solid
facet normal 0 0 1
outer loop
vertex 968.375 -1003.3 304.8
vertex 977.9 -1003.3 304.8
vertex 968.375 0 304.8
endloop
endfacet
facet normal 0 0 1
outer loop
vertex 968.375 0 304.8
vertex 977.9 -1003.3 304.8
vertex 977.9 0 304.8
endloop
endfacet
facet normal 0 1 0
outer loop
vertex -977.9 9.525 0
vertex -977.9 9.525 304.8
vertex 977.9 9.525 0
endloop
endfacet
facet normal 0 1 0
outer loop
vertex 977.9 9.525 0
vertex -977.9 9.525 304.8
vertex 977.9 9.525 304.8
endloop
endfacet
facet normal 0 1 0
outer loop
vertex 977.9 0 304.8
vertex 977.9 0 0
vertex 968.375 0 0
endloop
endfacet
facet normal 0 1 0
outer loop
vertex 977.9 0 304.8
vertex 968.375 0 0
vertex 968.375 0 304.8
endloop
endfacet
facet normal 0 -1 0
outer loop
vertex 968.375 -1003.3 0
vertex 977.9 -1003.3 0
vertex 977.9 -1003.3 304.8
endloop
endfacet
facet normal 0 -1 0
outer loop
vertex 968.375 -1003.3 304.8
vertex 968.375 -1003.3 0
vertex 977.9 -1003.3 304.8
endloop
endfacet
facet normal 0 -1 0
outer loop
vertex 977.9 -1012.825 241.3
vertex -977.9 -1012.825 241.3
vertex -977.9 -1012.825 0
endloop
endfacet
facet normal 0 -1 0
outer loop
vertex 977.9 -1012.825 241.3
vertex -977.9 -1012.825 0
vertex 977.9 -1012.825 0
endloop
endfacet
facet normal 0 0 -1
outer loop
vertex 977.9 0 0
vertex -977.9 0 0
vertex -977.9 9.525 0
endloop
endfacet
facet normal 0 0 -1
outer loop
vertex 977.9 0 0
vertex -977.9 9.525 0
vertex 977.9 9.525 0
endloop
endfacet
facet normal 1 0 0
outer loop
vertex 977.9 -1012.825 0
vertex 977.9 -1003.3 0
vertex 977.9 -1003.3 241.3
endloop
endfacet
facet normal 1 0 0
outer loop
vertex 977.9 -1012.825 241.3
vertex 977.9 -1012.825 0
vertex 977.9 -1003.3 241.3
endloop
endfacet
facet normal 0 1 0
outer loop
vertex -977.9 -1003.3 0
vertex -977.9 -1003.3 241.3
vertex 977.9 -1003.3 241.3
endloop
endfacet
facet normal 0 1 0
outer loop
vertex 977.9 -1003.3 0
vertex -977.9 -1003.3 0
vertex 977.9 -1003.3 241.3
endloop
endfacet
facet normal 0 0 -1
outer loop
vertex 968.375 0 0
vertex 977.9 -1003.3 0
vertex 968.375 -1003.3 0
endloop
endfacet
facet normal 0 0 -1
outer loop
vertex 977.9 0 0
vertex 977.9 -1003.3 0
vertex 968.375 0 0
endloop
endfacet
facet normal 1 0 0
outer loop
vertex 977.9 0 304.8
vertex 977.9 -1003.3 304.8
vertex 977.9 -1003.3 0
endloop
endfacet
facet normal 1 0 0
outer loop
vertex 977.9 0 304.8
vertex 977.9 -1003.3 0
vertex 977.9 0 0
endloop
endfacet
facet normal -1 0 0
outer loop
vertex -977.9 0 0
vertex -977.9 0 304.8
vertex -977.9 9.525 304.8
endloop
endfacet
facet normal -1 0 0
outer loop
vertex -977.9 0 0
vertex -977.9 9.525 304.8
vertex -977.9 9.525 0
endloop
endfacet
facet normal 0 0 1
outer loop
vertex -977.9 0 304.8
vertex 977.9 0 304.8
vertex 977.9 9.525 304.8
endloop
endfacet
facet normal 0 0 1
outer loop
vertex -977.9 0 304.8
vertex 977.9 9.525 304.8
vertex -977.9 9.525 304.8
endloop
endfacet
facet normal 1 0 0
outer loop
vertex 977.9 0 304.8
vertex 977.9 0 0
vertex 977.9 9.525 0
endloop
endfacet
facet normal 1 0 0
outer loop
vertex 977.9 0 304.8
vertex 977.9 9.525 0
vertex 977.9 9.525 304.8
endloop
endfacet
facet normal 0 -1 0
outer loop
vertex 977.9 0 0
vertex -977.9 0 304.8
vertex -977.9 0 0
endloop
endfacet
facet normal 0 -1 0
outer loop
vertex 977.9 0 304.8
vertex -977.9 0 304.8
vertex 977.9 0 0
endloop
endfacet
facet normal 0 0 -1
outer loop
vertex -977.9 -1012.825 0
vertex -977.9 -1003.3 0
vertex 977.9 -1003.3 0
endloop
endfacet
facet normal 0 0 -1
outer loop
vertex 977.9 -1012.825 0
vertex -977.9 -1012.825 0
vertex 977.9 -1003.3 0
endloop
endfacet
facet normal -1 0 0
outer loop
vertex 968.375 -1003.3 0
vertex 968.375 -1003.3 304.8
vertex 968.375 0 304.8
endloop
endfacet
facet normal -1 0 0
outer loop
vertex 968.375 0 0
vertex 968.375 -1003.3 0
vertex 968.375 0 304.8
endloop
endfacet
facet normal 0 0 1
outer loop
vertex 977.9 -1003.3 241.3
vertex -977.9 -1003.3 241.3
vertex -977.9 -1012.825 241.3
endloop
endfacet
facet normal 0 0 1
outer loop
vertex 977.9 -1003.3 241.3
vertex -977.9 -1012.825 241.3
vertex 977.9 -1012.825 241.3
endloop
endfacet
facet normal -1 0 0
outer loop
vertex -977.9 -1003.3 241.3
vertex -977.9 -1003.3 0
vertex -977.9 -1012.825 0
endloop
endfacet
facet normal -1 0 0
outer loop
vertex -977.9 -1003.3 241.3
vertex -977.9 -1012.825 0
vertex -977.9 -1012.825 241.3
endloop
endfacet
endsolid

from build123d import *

# Parameters (mm, degrees)
F1_DEPTH = 9.525
F3_W     = 1955.8
F3_H     = 241.3
F4_DEPTH = 9.525
F6_W     = 1003.3
F6_H     = 304.8
F7_DEPTH = 9.525


with BuildPart() as f1:
    # F0 (on Front) → F1 (new body)
    with BuildSketch(Plane.XZ):
        Polygon((-977.9, 304.8), (-977.9, 0), (0, 0), (977.9, 0), (977.9, 304.8), align=None)
    extrude(amount=-F1_DEPTH)


with BuildPart() as f4:
    # F3 (on offset) → F4 (new body)
    with BuildSketch(Plane.XZ.offset(1003.3)):
        with Locations((0, 120.65)):
            Rectangle(F3_W, F3_H)
    extrude(amount=F4_DEPTH)


with BuildPart() as f7:
    # F6 (on 3pt) → F7 (new body)
    with BuildSketch(Plane.YZ.offset(977.9)):
        with Locations((-501.65, 152.4)):
            Rectangle(F6_W, F6_H)
    extrude(amount=-F7_DEPTH)


solid = Compound([f1.part, f4.part, f7.part])
